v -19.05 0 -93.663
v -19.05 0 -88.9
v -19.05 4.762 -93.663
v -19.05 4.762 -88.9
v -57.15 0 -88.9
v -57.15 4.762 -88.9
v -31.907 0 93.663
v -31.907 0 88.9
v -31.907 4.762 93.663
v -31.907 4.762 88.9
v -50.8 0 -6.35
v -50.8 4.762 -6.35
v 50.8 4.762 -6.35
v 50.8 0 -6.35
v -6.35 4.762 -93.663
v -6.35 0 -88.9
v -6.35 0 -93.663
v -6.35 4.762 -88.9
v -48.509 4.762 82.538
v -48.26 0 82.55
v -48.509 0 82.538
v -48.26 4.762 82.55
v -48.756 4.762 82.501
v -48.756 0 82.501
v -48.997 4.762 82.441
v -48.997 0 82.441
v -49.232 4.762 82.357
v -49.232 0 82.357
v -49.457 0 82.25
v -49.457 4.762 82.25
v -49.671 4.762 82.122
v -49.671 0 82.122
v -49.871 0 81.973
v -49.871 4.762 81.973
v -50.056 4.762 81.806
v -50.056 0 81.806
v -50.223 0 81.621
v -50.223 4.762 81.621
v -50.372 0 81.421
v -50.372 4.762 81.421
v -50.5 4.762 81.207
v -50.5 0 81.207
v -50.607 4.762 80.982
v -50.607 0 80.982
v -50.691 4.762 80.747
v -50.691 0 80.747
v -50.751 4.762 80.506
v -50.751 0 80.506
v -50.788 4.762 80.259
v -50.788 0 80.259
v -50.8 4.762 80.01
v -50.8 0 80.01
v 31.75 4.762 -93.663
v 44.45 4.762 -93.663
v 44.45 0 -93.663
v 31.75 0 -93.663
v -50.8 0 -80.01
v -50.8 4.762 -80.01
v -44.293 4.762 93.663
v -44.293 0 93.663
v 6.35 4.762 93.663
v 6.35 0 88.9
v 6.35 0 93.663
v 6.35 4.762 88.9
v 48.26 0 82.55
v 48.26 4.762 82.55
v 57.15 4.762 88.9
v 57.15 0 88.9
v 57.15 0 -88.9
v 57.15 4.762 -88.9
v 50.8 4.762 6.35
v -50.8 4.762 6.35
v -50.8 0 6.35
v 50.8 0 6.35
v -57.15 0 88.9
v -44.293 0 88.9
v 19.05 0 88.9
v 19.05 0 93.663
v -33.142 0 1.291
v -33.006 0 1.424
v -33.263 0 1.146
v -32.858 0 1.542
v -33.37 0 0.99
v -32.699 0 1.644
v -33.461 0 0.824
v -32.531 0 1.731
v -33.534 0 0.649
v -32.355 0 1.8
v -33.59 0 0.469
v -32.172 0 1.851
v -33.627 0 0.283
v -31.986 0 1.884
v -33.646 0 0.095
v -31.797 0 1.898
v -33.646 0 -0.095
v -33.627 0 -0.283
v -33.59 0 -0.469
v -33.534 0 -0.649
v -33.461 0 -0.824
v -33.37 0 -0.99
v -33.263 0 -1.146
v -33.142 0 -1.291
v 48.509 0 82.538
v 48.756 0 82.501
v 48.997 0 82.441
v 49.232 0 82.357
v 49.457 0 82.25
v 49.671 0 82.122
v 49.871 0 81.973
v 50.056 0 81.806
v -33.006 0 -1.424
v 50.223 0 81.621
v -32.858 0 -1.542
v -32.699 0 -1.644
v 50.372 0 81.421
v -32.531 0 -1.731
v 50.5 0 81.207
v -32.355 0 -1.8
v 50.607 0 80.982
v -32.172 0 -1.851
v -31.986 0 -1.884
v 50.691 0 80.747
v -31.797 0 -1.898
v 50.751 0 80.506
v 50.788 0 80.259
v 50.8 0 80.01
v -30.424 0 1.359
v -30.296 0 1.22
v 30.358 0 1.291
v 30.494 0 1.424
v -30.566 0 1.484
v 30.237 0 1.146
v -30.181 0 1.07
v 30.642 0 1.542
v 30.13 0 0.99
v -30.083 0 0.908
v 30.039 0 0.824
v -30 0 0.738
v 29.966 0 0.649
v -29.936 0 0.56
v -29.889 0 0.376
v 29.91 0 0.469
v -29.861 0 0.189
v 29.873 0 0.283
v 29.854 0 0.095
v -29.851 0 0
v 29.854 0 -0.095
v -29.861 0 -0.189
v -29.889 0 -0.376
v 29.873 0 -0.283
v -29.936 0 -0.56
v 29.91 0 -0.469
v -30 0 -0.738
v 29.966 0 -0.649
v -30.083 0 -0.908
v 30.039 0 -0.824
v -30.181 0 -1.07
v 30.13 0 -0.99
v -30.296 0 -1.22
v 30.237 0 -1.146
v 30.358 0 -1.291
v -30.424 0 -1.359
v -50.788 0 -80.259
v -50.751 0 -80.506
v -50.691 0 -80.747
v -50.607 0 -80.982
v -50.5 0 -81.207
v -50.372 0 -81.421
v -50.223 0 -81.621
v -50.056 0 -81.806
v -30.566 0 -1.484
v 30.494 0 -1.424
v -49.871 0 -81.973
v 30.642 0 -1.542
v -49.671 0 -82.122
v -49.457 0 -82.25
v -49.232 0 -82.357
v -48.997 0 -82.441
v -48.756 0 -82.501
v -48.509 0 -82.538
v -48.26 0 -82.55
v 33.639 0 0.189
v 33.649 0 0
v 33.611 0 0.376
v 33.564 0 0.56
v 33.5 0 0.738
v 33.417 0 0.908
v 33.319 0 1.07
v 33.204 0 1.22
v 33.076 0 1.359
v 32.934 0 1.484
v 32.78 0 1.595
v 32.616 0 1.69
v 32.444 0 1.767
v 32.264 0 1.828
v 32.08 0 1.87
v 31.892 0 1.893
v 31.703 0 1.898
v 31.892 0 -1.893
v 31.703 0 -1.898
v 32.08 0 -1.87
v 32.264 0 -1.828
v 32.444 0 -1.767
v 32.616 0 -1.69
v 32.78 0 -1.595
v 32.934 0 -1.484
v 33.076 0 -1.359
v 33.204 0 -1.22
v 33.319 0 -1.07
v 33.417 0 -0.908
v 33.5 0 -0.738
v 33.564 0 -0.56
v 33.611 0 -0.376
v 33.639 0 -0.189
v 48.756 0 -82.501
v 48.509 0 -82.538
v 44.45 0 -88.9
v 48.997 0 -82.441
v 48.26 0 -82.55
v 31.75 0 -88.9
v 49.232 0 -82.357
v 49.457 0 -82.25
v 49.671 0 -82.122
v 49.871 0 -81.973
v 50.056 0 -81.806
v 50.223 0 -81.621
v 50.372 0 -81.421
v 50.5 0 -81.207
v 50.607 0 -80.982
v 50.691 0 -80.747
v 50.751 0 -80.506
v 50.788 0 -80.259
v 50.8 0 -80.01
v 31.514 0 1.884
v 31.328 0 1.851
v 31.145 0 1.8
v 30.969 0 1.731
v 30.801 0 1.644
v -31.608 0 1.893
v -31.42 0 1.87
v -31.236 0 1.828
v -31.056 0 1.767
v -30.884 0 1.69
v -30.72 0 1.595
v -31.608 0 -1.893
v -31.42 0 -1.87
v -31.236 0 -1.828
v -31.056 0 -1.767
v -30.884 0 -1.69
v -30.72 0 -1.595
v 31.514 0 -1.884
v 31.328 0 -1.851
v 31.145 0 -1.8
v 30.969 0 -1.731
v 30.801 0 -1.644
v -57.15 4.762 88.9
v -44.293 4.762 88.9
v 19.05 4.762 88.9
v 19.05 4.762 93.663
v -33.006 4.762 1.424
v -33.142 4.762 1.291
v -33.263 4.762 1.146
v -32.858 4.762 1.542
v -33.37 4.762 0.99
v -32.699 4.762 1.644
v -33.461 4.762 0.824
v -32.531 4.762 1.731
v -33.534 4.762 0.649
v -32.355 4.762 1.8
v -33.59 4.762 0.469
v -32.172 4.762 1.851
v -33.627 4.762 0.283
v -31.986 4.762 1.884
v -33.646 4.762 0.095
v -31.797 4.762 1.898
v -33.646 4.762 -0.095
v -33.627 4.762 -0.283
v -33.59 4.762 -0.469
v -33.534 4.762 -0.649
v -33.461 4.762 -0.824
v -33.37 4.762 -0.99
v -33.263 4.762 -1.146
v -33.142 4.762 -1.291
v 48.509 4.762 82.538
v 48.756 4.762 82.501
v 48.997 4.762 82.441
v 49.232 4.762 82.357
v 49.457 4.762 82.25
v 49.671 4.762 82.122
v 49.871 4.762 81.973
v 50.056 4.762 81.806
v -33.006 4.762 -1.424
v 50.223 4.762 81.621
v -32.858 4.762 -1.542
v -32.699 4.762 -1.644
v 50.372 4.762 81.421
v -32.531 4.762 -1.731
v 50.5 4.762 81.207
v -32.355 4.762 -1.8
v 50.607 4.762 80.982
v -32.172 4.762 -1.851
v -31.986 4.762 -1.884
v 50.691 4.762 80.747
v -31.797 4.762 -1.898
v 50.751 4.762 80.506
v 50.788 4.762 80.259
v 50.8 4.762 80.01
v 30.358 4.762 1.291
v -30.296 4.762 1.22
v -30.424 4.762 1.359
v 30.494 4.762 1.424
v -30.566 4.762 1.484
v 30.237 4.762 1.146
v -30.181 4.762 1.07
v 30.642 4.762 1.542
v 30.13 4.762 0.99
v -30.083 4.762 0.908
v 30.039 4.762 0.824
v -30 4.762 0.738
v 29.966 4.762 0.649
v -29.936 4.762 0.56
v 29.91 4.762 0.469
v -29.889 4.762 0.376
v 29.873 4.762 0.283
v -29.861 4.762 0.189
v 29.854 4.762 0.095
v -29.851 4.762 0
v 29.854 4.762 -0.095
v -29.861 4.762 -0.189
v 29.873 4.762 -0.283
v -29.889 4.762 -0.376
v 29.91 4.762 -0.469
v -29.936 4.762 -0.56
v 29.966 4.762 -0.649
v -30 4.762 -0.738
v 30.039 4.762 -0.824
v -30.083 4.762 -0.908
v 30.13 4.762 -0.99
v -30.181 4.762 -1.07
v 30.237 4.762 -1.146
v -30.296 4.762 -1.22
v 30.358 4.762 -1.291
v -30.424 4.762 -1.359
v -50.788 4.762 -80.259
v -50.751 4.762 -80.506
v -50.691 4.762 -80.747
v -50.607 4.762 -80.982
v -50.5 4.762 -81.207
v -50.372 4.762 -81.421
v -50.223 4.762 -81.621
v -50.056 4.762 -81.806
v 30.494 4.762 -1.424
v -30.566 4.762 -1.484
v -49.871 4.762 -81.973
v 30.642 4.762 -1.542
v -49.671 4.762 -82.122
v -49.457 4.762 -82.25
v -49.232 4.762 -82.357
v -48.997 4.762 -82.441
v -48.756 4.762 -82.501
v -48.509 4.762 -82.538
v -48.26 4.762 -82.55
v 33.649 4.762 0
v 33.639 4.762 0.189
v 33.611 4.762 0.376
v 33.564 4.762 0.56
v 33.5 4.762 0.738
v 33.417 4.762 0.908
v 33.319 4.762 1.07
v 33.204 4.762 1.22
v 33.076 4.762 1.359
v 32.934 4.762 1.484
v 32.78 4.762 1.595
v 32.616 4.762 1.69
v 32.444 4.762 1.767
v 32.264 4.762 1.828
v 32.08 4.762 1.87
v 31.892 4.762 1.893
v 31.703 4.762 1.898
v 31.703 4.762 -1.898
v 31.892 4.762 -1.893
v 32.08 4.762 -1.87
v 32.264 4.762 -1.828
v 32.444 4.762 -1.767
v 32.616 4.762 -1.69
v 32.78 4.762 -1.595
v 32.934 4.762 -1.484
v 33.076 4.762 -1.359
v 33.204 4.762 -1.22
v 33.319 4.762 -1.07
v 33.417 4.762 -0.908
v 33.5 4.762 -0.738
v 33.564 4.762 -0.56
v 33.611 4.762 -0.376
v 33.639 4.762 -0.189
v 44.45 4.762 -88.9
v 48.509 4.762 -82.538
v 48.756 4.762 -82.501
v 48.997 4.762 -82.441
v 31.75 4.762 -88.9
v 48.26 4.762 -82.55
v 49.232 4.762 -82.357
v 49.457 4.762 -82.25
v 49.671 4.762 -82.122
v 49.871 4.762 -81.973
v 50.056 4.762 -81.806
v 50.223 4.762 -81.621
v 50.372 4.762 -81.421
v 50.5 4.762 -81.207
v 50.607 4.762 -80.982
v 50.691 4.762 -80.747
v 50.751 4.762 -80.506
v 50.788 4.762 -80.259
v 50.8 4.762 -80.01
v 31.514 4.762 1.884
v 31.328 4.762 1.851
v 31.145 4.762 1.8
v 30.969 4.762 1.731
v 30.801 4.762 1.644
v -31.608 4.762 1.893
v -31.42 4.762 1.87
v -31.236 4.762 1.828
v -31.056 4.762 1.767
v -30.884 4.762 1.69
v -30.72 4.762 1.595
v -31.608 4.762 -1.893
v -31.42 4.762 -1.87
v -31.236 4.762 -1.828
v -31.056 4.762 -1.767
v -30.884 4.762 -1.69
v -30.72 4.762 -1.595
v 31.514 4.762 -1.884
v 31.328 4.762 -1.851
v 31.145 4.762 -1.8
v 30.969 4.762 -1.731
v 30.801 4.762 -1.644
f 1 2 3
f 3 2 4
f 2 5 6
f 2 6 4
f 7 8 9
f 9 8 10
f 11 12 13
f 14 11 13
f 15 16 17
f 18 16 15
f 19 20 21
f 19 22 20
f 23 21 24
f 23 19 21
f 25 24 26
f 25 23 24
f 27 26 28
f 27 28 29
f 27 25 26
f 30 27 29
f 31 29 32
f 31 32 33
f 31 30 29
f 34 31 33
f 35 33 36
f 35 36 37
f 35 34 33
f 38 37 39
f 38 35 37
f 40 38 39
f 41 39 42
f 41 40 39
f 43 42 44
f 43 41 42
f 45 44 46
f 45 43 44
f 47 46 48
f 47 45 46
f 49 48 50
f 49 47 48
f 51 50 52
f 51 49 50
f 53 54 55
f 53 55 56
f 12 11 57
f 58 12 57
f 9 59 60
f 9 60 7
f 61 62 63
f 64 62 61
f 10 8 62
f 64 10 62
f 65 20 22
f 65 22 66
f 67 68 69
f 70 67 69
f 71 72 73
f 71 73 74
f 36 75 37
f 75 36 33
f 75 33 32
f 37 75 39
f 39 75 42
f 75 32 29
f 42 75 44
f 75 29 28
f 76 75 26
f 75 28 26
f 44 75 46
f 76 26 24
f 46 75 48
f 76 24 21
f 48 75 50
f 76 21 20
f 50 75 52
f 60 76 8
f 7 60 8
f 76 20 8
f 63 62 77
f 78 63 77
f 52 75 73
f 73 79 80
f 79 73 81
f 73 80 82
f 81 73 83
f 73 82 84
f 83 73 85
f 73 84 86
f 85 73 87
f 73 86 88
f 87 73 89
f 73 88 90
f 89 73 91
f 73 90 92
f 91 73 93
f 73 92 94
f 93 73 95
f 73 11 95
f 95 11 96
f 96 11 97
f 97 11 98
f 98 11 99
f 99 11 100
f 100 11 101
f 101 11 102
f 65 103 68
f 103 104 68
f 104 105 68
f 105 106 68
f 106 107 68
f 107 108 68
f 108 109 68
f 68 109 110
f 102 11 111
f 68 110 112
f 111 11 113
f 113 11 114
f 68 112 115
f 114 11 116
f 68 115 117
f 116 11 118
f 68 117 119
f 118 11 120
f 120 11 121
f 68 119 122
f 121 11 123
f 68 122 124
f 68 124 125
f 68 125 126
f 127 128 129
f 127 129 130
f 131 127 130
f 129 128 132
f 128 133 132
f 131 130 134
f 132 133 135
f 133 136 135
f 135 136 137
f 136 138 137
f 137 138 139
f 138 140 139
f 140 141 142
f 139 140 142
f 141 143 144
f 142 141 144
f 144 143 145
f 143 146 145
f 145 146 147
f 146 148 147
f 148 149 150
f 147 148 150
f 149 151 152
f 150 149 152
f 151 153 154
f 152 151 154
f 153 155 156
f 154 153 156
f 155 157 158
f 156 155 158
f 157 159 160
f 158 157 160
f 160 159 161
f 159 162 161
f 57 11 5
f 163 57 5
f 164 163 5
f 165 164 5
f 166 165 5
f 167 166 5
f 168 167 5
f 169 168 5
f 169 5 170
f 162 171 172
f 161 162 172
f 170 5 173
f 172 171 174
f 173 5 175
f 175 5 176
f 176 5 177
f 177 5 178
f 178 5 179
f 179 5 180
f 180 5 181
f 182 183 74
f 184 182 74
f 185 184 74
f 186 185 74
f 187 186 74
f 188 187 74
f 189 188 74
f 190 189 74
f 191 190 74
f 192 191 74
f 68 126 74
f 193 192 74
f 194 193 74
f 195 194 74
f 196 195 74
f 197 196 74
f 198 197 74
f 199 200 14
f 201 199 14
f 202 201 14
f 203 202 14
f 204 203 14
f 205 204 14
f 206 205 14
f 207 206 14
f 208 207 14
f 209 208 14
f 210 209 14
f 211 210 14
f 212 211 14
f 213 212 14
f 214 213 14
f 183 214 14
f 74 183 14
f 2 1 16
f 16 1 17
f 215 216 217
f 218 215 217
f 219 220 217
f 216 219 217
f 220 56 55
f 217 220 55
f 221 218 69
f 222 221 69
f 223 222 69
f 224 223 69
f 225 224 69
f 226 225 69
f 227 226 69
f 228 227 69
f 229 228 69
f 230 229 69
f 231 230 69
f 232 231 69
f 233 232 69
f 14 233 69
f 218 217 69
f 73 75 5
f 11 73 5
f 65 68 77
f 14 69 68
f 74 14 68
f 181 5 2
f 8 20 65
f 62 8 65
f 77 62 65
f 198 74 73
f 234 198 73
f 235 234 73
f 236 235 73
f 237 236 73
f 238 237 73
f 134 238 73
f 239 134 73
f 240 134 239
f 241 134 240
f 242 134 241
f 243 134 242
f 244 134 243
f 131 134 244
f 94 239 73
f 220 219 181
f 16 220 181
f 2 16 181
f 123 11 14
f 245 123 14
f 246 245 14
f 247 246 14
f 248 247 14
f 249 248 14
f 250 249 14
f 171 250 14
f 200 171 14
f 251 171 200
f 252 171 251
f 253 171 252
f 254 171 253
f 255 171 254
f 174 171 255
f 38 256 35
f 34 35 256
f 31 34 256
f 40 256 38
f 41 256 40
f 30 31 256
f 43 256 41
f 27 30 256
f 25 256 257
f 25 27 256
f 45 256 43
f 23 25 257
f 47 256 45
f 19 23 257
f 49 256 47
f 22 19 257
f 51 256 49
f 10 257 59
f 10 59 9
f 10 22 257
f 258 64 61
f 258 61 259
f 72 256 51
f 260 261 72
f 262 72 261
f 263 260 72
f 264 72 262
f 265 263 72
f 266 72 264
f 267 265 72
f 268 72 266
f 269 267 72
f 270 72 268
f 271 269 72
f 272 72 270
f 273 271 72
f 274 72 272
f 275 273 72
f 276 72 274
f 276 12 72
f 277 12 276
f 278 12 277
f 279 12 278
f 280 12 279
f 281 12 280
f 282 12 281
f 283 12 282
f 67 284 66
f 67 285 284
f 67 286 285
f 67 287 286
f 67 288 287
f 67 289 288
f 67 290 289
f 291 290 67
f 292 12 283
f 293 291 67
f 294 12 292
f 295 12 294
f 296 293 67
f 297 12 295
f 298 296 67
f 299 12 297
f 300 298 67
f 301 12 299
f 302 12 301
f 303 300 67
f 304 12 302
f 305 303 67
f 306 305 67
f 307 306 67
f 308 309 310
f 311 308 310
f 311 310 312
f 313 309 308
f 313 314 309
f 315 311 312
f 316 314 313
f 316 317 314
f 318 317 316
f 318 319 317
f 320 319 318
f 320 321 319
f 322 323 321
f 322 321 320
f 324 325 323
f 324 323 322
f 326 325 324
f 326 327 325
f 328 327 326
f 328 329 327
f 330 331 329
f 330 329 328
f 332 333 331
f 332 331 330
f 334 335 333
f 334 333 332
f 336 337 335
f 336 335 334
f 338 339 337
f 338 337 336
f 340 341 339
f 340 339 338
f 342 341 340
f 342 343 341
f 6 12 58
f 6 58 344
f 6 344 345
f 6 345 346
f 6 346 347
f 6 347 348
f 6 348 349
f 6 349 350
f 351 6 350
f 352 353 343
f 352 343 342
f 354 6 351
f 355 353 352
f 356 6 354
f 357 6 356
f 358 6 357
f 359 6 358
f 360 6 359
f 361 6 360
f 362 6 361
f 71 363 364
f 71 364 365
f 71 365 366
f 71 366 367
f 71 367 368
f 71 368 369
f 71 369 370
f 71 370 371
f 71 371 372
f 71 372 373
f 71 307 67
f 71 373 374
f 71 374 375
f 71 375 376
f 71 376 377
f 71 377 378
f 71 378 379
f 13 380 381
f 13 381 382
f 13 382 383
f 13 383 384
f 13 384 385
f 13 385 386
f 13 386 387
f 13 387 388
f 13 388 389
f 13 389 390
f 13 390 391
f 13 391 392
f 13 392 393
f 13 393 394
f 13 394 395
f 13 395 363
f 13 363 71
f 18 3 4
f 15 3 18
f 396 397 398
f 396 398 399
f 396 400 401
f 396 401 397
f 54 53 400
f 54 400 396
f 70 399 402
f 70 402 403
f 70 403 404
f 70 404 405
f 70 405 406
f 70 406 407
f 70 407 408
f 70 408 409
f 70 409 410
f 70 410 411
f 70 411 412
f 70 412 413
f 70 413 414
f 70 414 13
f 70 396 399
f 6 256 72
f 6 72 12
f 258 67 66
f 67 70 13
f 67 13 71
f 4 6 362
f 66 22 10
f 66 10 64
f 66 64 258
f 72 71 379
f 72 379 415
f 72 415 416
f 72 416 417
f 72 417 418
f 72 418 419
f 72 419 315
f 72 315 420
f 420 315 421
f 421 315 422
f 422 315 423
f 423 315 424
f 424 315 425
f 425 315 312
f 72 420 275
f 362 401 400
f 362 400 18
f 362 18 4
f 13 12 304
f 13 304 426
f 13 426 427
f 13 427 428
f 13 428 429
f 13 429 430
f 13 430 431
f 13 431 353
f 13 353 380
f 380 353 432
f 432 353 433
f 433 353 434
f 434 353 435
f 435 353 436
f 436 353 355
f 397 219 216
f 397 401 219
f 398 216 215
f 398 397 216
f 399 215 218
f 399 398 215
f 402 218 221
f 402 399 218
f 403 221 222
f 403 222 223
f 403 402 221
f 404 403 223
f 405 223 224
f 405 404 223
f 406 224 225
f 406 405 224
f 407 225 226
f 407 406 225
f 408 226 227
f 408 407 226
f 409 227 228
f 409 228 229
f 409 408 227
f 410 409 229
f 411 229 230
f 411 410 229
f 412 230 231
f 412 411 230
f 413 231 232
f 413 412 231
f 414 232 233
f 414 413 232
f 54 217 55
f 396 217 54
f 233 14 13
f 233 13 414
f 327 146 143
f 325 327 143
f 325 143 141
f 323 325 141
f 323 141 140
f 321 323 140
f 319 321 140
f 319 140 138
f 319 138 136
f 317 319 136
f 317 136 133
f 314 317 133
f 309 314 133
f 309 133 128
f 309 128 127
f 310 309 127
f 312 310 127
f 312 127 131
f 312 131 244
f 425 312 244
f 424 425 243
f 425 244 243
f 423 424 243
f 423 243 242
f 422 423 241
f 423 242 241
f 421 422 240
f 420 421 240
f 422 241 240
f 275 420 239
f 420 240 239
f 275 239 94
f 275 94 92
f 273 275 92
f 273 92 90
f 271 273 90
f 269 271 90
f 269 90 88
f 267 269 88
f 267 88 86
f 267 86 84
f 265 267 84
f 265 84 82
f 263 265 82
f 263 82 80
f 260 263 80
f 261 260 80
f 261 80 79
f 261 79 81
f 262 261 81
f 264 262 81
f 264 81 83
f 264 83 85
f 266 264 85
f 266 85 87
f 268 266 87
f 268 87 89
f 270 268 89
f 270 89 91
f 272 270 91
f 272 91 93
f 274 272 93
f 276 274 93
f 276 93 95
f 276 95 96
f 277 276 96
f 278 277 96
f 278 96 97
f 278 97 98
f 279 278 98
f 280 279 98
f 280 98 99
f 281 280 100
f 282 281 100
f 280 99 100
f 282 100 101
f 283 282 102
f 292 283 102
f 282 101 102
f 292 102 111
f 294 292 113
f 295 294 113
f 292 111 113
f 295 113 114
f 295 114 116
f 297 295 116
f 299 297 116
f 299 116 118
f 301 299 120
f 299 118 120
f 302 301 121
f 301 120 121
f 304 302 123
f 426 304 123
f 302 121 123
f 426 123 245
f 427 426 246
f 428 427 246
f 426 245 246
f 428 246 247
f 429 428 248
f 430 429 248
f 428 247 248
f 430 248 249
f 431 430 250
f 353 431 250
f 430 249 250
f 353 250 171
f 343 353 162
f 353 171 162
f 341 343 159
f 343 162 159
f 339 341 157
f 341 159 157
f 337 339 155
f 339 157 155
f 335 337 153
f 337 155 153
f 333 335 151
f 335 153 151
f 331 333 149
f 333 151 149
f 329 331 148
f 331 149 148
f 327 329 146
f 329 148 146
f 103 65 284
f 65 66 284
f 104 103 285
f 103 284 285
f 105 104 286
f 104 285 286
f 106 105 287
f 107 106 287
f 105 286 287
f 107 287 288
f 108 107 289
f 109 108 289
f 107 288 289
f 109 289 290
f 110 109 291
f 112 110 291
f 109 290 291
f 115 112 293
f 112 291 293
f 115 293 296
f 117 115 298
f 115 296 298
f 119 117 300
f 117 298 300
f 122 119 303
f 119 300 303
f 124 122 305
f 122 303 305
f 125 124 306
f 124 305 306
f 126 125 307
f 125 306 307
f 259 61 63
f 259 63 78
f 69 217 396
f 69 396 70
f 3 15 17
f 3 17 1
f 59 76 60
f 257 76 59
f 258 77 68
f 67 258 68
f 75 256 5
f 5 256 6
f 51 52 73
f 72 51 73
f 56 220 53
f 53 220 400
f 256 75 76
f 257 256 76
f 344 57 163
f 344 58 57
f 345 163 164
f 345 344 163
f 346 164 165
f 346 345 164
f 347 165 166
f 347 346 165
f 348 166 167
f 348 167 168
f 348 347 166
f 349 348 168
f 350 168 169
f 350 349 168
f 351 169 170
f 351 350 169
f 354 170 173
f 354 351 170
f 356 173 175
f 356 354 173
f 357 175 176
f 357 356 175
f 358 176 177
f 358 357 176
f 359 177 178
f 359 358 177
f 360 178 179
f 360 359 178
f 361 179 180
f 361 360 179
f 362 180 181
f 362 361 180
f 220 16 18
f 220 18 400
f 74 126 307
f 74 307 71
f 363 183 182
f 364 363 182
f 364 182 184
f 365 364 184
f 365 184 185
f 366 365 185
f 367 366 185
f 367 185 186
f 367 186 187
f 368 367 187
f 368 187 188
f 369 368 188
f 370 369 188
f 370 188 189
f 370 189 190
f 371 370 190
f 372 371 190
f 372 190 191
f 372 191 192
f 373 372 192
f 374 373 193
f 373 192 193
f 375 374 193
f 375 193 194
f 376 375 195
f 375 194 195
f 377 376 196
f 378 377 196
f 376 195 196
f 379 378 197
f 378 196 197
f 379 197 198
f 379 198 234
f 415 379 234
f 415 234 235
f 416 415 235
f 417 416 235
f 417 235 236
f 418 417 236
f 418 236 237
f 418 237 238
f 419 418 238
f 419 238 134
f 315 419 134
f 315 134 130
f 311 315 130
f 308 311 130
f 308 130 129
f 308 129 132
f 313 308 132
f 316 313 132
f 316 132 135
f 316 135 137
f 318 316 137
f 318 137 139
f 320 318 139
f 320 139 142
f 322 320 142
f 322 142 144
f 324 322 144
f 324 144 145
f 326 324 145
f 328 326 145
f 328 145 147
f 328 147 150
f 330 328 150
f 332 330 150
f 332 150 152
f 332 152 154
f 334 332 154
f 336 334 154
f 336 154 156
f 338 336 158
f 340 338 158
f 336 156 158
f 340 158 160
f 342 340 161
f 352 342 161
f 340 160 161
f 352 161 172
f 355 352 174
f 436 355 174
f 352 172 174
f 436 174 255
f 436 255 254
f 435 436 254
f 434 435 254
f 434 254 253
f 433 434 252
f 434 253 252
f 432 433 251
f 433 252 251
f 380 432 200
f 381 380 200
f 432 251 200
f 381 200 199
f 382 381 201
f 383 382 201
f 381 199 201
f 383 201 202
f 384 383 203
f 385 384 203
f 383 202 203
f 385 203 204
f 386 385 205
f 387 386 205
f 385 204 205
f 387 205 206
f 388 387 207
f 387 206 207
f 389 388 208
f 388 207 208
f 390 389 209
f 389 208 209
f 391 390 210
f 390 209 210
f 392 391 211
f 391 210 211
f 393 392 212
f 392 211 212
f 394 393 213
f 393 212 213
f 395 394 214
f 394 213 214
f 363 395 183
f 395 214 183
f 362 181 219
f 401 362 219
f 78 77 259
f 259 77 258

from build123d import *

# Parameters (mm, degrees)
SKETCH1_W                 = 114.3
SKETCH1_H                 = 177.8
SKETCH1_W_2               = 101.6
SKETCH1_H_2               = 165.1
BOSS_EXTRUDE1_DEPTH       = 4.7625
SKETCH2_W                 = 12.38677804
SKETCH2_H                 = 4.7625
SKETCH2_W_2               = 12.7
BOSS_EXTRUDE2_DEPTH       = 4.7625
SKETCH3_W                 = 12.7
SKETCH3_H                 = 4.7625
BOSS_EXTRUDE3_DEPTH       = 4.7625
FILLET1_R                 = 2.54
SKETCH4_W                 = 114.3
SKETCH4_H                 = 12.7
BOSS_EXTRUDE4_DEPTH       = 4.7625
F_6_CLEARANCE_HOLE1_D     = 3.7973
F_6_CLEARANCE_HOLE1_DEPTH = 25.4
F_6_CLEARANCE_HOLE1_TIP   = 1.140824014


with BuildPart() as part:
    # Sketch1 → Boss-Extrude1 (new body)
    with BuildSketch(Plane(origin=(0, 0, 0), x_dir=(1, 0, 0), z_dir=(0, 1, 0))):
        Rectangle(SKETCH1_W, SKETCH1_H)
        Rectangle(SKETCH1_W_2, SKETCH1_H_2, mode=Mode.SUBTRACT)
    extrude(amount=BOSS_EXTRUDE1_DEPTH)

    # Sketch2 → Boss-Extrude2 (add)
    with BuildSketch(Plane.XY.offset(88.9)):
        with Locations((-38.1, 2.38125)):
            Rectangle(SKETCH2_W, SKETCH2_H)
        with Locations((12.7, 2.38125)):
            Rectangle(SKETCH2_W_2, SKETCH2_H)
    extrude(amount=BOSS_EXTRUDE2_DEPTH)

    # Sketch3 → Boss-Extrude3 (add)
    with BuildSketch(Plane(origin=(0, 0, -88.9), x_dir=(-1, 0, 0), z_dir=(0, 0, -1))):
        with Locations((-38.1, 2.38125)):
            Rectangle(SKETCH3_W, SKETCH3_H)
        with Locations((12.7, 2.38125)):
            Rectangle(SKETCH3_W, SKETCH3_H)
    extrude(amount=BOSS_EXTRUDE3_DEPTH)

    # Fillet1
    fillet1_edges = [part.edges().sort_by_distance(p)[0] for p in [
        (50.8, 2.38125, 82.55),
        (50.8, 2.38125, -82.55),
        (-50.8, 2.38125, -82.55),
        (-50.8, 2.38125, 82.55),
    ]]
    fillet(fillet1_edges, radius=FILLET1_R)

    # Sketch4 → Boss-Extrude4 (add)
    with BuildSketch(Plane(origin=(0, 4.7625, 0), x_dir=(1, 0, 0), z_dir=(0, 1, 0))):
        Rectangle(SKETCH4_W, SKETCH4_H)
    extrude(amount=-BOSS_EXTRUDE4_DEPTH)

    # #6 Clearance Hole1
    with Locations(Plane(origin=(0, 4.7625, 0), x_dir=(-1, 0, 0), z_dir=(0, 1, 0))):
        with Locations((31.75, 0), (-31.75, 0)):
            Hole(F_6_CLEARANCE_HOLE1_D / 2, depth=F_6_CLEARANCE_HOLE1_DEPTH)
            with Locations((0, 0, -(F_6_CLEARANCE_HOLE1_DEPTH + F_6_CLEARANCE_HOLE1_TIP / 2))):  # 118° drill point
                Cone(0, F_6_CLEARANCE_HOLE1_D / 2, F_6_CLEARANCE_HOLE1_TIP, mode=Mode.SUBTRACT)


solid = part.part
